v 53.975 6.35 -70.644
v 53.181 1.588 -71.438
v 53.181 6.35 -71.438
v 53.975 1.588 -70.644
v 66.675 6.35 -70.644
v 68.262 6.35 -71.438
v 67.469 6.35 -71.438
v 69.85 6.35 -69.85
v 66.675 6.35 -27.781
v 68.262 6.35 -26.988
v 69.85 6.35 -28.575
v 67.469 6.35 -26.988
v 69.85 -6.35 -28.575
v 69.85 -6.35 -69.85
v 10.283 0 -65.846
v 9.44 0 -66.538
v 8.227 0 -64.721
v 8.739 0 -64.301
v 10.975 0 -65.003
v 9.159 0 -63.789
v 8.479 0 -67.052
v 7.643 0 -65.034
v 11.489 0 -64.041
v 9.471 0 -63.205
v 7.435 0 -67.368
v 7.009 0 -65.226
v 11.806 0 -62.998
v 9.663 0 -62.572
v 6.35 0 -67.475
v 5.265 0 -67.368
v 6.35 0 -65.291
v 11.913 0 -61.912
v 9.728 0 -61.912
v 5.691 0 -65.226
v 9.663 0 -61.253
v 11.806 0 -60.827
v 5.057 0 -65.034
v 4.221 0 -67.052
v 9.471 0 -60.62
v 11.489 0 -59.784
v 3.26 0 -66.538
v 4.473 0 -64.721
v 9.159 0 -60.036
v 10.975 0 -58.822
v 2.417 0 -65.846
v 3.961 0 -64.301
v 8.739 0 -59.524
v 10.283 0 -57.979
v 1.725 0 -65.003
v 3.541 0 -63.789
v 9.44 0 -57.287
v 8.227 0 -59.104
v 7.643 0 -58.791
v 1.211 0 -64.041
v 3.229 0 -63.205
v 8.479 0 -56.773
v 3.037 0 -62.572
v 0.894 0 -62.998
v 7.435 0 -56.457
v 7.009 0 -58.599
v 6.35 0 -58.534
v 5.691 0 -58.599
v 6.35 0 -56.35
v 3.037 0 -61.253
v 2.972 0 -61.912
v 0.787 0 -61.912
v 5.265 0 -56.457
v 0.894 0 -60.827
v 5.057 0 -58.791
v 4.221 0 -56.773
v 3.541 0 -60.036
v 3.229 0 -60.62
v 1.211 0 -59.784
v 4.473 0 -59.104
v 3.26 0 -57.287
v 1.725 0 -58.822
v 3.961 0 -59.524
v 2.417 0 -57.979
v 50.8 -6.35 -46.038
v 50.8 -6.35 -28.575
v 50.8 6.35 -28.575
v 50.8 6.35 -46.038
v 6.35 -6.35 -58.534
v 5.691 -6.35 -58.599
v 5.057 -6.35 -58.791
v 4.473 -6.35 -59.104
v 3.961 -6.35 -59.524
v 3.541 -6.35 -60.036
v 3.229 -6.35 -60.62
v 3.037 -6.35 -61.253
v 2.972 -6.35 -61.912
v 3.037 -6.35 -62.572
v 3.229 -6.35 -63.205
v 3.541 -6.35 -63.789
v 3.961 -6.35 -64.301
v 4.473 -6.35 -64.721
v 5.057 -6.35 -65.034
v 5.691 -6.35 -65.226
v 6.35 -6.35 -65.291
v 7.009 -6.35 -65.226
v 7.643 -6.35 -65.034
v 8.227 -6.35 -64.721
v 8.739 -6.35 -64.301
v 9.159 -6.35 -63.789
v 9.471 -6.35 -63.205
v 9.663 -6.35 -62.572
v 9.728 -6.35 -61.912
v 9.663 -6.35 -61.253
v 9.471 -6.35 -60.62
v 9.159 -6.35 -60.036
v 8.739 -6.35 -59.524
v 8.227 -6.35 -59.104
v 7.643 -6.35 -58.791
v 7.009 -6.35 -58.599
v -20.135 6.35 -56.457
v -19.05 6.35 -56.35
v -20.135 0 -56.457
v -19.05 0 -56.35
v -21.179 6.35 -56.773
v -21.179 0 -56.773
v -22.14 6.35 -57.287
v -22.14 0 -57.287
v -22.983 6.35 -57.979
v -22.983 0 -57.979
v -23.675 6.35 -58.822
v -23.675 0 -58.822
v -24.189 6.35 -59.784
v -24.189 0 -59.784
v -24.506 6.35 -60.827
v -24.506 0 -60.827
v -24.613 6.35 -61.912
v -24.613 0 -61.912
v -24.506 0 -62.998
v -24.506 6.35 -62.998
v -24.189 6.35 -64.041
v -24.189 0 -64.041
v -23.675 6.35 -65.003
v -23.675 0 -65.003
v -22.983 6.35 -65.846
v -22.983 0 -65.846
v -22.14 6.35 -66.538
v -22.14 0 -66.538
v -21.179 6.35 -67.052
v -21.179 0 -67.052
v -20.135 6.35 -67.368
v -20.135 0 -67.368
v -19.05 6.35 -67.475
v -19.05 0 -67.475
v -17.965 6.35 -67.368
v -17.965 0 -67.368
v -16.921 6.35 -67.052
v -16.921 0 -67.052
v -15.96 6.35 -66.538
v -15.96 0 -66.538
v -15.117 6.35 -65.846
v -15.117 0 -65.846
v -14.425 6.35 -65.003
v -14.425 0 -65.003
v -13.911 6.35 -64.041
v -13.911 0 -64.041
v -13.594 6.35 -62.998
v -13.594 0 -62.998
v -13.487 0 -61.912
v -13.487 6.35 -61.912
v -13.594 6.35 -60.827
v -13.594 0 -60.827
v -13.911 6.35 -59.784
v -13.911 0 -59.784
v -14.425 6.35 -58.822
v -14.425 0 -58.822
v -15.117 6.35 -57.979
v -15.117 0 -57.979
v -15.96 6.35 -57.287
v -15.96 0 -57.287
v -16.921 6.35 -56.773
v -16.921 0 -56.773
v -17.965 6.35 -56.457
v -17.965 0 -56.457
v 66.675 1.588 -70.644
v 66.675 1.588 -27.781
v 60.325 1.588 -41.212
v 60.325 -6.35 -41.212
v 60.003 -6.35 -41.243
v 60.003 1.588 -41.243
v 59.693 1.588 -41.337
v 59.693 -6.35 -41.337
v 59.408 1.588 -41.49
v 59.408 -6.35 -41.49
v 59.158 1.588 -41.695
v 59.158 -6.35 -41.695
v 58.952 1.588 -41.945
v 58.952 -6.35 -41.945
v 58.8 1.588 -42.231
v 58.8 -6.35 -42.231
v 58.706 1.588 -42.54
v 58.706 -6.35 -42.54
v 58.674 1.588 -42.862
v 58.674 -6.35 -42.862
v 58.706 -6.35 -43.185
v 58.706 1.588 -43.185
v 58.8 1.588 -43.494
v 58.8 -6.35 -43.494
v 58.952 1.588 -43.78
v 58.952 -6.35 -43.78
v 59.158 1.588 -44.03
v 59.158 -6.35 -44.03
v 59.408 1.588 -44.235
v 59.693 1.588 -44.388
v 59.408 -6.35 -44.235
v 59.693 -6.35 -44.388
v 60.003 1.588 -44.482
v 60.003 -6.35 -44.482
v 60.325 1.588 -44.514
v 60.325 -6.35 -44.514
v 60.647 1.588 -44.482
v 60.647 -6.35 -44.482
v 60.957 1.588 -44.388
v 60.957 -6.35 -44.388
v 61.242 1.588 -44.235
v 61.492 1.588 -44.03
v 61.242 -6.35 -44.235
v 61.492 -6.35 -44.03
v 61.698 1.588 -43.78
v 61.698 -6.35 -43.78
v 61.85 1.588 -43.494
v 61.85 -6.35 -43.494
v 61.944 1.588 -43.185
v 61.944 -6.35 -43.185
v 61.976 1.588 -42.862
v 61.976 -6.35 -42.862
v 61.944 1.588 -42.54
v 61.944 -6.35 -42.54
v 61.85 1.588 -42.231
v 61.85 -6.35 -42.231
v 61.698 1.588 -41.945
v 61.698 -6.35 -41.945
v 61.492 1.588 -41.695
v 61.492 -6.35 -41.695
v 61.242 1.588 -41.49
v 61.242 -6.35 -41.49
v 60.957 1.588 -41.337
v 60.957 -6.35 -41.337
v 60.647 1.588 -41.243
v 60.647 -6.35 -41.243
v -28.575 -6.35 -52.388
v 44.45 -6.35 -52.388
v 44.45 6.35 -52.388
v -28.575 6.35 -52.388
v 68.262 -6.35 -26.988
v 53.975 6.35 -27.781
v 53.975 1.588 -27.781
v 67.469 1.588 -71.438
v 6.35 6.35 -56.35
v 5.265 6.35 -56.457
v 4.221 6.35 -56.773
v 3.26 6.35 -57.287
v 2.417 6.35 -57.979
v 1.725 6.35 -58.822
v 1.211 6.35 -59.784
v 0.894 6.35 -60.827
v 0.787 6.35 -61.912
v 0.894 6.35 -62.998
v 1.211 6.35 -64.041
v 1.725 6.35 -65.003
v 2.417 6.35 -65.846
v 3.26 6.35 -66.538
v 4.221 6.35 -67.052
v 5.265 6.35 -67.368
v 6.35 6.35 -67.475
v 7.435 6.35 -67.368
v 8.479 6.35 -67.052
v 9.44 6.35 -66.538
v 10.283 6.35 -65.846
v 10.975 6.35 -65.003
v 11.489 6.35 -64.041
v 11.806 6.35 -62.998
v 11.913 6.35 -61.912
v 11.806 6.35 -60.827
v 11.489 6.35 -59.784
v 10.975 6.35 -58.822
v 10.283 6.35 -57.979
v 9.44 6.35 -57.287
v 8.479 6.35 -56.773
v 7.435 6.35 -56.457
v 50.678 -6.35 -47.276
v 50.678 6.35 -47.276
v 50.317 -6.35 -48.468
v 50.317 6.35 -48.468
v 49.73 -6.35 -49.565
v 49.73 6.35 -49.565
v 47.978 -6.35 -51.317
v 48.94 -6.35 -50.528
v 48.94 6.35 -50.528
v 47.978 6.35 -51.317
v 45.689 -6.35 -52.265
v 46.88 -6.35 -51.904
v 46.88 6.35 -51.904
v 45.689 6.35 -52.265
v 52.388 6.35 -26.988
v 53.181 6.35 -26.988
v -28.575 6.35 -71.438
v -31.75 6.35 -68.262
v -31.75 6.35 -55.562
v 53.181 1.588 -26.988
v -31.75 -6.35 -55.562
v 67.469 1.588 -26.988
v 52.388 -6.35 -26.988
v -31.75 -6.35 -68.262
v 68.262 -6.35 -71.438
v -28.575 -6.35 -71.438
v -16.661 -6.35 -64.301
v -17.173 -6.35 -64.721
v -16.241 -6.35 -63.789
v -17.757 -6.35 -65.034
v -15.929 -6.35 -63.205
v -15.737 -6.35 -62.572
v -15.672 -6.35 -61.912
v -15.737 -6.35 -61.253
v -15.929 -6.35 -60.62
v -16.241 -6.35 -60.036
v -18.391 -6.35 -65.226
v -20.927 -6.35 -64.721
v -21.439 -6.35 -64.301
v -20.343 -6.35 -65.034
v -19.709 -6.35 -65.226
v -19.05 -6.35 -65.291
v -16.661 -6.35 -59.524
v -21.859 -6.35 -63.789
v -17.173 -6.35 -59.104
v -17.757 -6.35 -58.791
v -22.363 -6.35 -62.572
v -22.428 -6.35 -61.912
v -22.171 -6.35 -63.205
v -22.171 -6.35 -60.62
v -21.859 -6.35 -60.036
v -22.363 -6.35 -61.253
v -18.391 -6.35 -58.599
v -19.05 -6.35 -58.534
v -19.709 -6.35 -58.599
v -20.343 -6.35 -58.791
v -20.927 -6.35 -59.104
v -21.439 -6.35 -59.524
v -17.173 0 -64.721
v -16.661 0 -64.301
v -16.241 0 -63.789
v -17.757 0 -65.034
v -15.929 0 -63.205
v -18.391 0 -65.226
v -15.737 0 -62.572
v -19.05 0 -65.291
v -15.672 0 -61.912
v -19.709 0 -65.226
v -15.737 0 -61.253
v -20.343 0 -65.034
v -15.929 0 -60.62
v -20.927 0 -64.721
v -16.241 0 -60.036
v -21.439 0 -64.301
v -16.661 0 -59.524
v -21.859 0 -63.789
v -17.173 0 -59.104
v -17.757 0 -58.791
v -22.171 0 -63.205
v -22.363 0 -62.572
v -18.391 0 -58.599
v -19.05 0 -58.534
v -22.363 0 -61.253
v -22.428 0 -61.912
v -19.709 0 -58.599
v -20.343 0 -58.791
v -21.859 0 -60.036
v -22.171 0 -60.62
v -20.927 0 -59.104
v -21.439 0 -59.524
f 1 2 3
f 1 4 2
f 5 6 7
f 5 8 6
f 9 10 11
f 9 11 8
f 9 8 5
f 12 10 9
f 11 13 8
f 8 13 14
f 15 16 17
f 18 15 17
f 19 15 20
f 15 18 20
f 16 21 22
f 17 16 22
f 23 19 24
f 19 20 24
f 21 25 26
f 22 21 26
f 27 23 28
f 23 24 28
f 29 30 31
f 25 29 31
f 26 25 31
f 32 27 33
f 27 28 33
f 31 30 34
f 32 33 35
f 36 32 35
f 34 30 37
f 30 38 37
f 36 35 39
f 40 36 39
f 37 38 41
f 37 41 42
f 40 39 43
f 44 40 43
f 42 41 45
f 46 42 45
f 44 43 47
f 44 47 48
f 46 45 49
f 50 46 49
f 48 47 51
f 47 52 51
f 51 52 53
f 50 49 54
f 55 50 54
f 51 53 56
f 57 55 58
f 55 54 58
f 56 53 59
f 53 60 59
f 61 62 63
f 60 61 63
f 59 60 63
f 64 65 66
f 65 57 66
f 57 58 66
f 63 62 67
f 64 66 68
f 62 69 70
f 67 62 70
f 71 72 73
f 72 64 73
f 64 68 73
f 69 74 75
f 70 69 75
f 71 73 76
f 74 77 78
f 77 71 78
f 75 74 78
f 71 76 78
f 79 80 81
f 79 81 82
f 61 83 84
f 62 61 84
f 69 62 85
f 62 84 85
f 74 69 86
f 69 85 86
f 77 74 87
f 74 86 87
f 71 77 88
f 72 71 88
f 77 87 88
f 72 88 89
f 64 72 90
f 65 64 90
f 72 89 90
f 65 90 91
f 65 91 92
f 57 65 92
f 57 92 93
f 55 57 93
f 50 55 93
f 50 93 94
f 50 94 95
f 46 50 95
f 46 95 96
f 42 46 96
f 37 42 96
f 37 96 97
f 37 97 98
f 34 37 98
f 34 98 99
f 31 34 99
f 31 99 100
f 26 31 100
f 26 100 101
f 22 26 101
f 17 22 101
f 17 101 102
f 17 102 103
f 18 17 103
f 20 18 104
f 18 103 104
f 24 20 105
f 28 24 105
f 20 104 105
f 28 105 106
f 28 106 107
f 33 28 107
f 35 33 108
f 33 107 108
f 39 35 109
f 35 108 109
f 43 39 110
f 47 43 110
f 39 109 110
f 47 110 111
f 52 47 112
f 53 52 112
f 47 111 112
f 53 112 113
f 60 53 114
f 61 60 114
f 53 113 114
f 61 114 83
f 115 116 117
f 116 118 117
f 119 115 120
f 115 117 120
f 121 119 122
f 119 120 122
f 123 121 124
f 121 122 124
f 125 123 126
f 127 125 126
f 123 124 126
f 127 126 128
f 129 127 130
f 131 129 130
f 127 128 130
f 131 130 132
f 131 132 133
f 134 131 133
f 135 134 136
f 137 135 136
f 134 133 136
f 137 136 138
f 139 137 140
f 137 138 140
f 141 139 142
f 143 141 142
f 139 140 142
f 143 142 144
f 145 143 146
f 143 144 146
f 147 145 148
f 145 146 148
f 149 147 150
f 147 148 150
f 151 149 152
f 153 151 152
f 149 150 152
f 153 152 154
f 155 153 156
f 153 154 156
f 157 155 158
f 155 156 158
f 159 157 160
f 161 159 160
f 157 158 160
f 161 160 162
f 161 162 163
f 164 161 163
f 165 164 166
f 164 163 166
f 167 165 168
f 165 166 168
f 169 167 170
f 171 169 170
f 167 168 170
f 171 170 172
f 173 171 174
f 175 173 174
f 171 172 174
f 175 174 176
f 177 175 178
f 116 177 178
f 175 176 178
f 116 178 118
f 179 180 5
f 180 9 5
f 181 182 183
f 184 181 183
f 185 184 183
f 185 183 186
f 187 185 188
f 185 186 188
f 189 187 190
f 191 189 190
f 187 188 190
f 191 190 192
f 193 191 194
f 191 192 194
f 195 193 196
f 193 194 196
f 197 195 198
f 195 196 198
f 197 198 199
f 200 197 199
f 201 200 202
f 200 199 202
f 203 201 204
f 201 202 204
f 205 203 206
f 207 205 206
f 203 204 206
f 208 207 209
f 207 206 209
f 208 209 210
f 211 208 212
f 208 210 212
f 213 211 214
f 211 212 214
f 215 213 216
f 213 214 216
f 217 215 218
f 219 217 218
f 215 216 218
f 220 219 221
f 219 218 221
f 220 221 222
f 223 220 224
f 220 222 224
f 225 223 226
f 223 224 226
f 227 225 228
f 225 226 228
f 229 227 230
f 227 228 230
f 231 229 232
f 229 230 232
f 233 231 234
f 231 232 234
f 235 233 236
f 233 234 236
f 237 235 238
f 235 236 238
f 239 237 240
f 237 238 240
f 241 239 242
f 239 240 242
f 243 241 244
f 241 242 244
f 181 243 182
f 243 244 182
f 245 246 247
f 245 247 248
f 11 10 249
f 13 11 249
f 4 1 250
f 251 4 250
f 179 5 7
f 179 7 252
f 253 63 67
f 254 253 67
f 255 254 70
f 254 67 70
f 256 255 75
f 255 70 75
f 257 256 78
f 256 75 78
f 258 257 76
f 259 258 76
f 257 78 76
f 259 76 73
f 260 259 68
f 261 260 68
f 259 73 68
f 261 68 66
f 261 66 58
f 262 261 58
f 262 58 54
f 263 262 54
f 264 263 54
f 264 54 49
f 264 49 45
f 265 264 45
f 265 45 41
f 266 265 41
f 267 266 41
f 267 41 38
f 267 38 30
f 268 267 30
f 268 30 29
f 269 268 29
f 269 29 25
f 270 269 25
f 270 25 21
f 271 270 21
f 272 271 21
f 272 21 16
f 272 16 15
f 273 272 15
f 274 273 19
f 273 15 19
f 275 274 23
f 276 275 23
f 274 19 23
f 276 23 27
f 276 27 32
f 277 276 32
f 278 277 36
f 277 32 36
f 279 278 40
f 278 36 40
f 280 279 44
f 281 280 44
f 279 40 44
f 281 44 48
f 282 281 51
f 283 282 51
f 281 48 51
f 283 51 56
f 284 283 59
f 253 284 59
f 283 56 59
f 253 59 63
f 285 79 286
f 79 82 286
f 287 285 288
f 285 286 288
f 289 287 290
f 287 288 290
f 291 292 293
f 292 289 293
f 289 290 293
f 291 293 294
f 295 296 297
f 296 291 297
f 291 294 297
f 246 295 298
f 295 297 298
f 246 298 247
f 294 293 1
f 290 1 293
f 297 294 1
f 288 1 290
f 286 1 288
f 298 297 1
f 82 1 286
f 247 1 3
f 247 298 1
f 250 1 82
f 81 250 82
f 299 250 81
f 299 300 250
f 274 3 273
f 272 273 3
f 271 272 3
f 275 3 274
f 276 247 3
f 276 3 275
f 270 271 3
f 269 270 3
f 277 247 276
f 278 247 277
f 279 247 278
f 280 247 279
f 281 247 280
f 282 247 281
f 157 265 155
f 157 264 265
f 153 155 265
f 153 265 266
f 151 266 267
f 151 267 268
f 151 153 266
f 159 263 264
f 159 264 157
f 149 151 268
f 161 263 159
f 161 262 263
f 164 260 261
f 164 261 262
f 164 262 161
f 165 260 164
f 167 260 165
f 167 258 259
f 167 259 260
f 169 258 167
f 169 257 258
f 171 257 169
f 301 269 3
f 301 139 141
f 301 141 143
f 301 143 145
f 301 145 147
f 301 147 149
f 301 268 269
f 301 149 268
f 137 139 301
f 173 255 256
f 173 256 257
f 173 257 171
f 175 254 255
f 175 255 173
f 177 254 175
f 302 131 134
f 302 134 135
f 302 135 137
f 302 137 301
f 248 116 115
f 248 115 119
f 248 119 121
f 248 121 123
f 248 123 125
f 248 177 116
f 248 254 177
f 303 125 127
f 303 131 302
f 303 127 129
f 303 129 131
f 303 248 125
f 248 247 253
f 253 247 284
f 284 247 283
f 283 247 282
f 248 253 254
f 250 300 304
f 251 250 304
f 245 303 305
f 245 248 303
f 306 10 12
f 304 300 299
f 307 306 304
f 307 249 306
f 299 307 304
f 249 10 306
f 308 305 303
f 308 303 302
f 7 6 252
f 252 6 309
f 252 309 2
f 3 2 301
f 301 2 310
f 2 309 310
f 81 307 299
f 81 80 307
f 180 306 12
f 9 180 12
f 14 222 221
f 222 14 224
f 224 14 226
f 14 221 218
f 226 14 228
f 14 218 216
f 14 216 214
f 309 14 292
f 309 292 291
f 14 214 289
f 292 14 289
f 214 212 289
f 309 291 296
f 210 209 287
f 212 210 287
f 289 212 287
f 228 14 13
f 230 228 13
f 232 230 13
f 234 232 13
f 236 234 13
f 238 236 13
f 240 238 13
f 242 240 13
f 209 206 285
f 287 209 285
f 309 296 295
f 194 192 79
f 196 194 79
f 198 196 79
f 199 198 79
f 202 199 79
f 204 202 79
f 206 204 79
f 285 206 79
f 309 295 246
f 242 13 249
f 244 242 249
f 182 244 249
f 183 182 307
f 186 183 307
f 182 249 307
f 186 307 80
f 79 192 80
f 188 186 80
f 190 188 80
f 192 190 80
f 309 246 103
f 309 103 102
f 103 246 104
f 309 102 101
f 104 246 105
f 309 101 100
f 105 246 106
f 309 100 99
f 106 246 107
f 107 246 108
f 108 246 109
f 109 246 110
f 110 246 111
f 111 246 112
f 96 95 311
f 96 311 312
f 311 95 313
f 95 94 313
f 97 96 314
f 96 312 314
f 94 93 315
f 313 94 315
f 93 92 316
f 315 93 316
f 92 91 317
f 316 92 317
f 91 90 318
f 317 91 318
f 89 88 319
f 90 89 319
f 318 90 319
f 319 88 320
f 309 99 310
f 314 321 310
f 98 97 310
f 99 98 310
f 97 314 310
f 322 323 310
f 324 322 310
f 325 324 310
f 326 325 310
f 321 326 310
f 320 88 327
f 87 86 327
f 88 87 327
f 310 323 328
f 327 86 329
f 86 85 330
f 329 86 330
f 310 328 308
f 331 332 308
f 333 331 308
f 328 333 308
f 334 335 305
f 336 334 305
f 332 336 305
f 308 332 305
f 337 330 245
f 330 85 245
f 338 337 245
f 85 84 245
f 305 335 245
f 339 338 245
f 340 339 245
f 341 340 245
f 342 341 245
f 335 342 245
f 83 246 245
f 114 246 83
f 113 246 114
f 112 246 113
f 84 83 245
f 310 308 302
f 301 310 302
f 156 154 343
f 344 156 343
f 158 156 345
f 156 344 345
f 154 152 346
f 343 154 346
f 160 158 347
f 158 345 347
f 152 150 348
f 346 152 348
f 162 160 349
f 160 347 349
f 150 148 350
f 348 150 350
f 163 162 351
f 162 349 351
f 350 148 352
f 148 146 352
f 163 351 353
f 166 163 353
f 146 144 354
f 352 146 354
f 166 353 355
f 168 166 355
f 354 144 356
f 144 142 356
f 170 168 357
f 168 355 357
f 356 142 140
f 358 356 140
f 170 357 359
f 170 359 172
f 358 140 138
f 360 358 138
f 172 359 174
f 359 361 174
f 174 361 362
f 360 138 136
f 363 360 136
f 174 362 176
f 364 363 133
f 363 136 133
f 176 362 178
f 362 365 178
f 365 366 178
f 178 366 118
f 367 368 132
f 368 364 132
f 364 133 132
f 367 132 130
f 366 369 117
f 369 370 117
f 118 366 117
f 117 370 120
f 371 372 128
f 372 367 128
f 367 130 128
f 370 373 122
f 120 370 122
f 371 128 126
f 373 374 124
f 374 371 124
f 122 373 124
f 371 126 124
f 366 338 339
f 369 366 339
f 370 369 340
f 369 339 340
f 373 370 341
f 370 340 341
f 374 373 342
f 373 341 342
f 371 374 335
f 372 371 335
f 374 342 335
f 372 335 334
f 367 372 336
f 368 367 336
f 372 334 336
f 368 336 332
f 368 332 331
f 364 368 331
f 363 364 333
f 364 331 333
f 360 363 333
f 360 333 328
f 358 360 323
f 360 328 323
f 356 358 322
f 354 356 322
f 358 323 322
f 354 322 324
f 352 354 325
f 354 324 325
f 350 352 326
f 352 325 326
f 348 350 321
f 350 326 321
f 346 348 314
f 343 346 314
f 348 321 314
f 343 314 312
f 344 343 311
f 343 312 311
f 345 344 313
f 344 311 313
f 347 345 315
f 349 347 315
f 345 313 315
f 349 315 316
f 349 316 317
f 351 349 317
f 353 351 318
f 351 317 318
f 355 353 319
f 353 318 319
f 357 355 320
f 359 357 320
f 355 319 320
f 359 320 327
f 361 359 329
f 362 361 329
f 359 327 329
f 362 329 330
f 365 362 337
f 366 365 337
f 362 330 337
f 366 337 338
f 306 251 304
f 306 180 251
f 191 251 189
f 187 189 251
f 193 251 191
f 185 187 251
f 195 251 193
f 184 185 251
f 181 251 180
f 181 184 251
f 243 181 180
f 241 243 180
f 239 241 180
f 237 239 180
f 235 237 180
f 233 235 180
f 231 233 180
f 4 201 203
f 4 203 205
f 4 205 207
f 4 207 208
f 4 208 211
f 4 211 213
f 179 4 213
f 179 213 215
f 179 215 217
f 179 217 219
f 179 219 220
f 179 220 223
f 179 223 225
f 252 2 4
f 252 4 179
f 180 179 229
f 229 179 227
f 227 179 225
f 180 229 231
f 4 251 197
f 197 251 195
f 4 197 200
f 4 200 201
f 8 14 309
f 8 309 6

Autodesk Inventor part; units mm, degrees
ref_plane "YZ Plane" through (0, 0, 0) normal (1, 0, 0) x (0, 1, 0)
ref_plane "XZ Plane" through (0, 0, 0) normal (0, 1, 0) x (-1, 0, 0)
ref_plane "XY Plane" through (0, 0, 0) normal (0, 0, 1) x (1, 0, 0)
sketch "Sketch1" plane through (0, 0, 0) normal (0, 1, 0) x (-1, 0, 0)
  line L0 (0, -85.725) -> (0, 14.2875) projected
  line L1 (-90.17, 0) -> (52.07, 0) projected
  line L2 (-50.8, -52.3875) -> (31.75, -52.3875)
  line L3 (-69.85, -71.4375) -> (31.75, -71.4375)
  line L4 (-69.85, -26.9875) -> (-50.8, -26.9875)
  line L5 (-50.8, -26.9875) -> (-50.8, -52.3875)
  line L6 (-69.85, -26.9875) -> (-69.85, -71.4375)
  line L7 (-53.975, -26.9875) -> (-66.675, -26.9875) construction
  line L8 (-66.675, -26.9875) -> (-66.675, -71.4375) construction
  line L9 (-66.675, -71.4375) -> (-53.975, -71.4375) construction
  line L10 (-53.975, -71.4375) -> (-53.975, -26.9875) construction
  line L11 (-60.325, -26.9875) -> (-60.325, -71.4375) construction
  line L12 (31.75, -52.3875) -> (31.75, -71.4375)
  point P0 (0, 0)
  dimension "d3" = 26.9875
  dimension "d5" = 19.05
  dimension "d6" = 3.175
  dimension "d7" = 50.8
  dimension "d11" = 19.05
  dimension "d57" = 101.6
  dimension "d58" = 12.7
  dimension "d59" = 44.45
extrude "Extrusion1" add sketch "Sketch1" along normal mid plane 12.7
sketch "Sketch2" plane through (0, 6.35, 0) normal (0, 1, 0) x (1, 0, 0)
  line L0 (-31.75, 52.3875) -> (50.8, 52.3875) projected
  line L1 (50.8, 52.3875) -> (50.8, 26.9875) projected
  line L2 (50.8, 26.9875) -> (69.85, 26.9875) projected
  line L3 (69.85, 26.9875) -> (69.85, 71.4375) projected
  line L4 (69.85, 71.4375) -> (-31.75, 71.4375) projected
  line L5 (50.8, 26.9875) -> (69.85, 26.9875) projected
  line L6 (69.85, 71.4375) -> (-31.75, 71.4375) projected
  line L7 (53.975, 26.9875) -> (66.675, 26.9875)
  line L8 (66.675, 26.9875) -> (66.675, 71.4375)
  line L9 (66.675, 71.4375) -> (53.975, 71.4375)
  line L10 (53.975, 71.4375) -> (53.975, 26.9875)
  line L11 (60.325, -63.5) -> (60.325, 99.2856) construction
  line L12 (102.235, 0) -> (-124.46, 0) projected
  line L13 (-31.75, 71.4375) -> (-31.75, 52.3875) projected
  point P0 (0, 0)
  point P1 (60.325, 26.9875)
  dimension "d60" = 12.7
  dimension "d61" = 6.35
extrude "Extrusion2" cut sketch "Sketch2" against normal blind 4.7625 contours L4 L8 L2 L10
chamfer "Chamfer1" distance 1.5875 angle 45 3 edges at (69.85, 0, -26.9875) (69.85, 0, -71.4375) (50.8, 0, -26.9875)
sketch "Sketch4" plane through (0, 1.5875, 0) normal (0, 1, 0) x (1, 0, 0)
  line L0 (53.975, 71.4375) -> (66.675, 71.4375) projected
  line L1 (53.975, 26.9875) -> (53.975, 71.4375) projected
  line L2 (66.675, 26.9875) -> (53.975, 26.9875) projected
  line L3 (66.675, 71.4375) -> (66.675, 26.9875) projected
  point P0 (0, 0)
  point P1 (60.325, 42.8625)
  dimension "d44" = 15.875
  dimension "d46" = 6.35
hole "Hole2" at (60.325, 1.5875, -42.8625) direction (0, -1, 0) diameter 3.302 end through all thread size "8-32 UNC" class "2B" standard "ANSI Unified Screw Threads"
chamfer "Chamfer3" distance 0.7937 angle 45 4 edges at (66.675, 3.9687, -26.9875) (53.975, 3.9687, -26.9875) (53.975, 3.9687, -71.4375) (66.675, 3.9687, -71.4375)
sketch "Sketch5" plane through (0, 6.35, 0) normal (0, 1, 0) x (1, 0, 0)
  line L0 (53.1813, 71.4375) -> (53.975, 70.6437) projected
  line L1 (53.1813, 71.4375) -> (-31.75, 71.4375) projected
  line L2 (-31.75, 71.4375) -> (-31.75, 52.3875) projected
  line L3 (-31.75, 52.3875) -> (50.8, 52.3875) projected
  line L4 (50.8, 52.3875) -> (50.8, 28.575) projected
  line L5 (52.3875, 26.9875) -> (50.8, 28.575) projected
  line L6 (52.3875, 26.9875) -> (53.1813, 26.9875) projected
  line L7 (53.975, 27.7812) -> (53.1813, 26.9875) projected
  line L8 (53.975, 27.7812) -> (53.975, 70.6437) projected
  line L9 (-31.75, 71.4375) -> (-31.75, 52.3875) construction
  line L10 (-31.75, 61.9125) -> (53.975, 61.9125) construction
  point P0 (0, 0)
  point P1 (-19.05, 61.9125)
  point P2 (6.35, 61.9125)
  dimension "d62" = 12.7
  dimension "d63" = 25.4
hole "Hole3" at (-19.05, 6.35, -61.9125) at (6.35, 6.35, -61.9125) direction (0, -1, 0) diameter 6.7564 end through all counterbore diameter 11.1252 counterbore depth 6.35 clearance for "Socket Head Cap Screw" size "1/4" standard "Ansi Unified Screw Threads"
chamfer "Chamfer4" distance 3.175 angle 45 2 edges at (-31.75, 0, -52.3875) (-31.75, 0, -71.4375)
fillet "Fillet2" radius 6.35 1 edges at (50.8, 0, -52.3875)
ref_plane "Work Plane3" through (-28.575, -6.35, -61.9125) normal (0, 0, 1) x (1, 0, 0)
ref_plane "Work Plane4" through (60.325, -6.35, -69.85) normal (1, 0, 0) x (0, 0, -1)
equation "\"d3\" = 0.5 * d2"
equation "\"d7\" = 0.5 * d4"
equation "\"d11\" = d10"
equation "\"d61\" = 0.5 * d60"
equation "\"d2\" = 53.975"
equation "\"d4\" = 101.6"
equation "\"d10\" = 19.05"
properties part number "Holder - headbars - L - RH" material "Stainless Steel"
